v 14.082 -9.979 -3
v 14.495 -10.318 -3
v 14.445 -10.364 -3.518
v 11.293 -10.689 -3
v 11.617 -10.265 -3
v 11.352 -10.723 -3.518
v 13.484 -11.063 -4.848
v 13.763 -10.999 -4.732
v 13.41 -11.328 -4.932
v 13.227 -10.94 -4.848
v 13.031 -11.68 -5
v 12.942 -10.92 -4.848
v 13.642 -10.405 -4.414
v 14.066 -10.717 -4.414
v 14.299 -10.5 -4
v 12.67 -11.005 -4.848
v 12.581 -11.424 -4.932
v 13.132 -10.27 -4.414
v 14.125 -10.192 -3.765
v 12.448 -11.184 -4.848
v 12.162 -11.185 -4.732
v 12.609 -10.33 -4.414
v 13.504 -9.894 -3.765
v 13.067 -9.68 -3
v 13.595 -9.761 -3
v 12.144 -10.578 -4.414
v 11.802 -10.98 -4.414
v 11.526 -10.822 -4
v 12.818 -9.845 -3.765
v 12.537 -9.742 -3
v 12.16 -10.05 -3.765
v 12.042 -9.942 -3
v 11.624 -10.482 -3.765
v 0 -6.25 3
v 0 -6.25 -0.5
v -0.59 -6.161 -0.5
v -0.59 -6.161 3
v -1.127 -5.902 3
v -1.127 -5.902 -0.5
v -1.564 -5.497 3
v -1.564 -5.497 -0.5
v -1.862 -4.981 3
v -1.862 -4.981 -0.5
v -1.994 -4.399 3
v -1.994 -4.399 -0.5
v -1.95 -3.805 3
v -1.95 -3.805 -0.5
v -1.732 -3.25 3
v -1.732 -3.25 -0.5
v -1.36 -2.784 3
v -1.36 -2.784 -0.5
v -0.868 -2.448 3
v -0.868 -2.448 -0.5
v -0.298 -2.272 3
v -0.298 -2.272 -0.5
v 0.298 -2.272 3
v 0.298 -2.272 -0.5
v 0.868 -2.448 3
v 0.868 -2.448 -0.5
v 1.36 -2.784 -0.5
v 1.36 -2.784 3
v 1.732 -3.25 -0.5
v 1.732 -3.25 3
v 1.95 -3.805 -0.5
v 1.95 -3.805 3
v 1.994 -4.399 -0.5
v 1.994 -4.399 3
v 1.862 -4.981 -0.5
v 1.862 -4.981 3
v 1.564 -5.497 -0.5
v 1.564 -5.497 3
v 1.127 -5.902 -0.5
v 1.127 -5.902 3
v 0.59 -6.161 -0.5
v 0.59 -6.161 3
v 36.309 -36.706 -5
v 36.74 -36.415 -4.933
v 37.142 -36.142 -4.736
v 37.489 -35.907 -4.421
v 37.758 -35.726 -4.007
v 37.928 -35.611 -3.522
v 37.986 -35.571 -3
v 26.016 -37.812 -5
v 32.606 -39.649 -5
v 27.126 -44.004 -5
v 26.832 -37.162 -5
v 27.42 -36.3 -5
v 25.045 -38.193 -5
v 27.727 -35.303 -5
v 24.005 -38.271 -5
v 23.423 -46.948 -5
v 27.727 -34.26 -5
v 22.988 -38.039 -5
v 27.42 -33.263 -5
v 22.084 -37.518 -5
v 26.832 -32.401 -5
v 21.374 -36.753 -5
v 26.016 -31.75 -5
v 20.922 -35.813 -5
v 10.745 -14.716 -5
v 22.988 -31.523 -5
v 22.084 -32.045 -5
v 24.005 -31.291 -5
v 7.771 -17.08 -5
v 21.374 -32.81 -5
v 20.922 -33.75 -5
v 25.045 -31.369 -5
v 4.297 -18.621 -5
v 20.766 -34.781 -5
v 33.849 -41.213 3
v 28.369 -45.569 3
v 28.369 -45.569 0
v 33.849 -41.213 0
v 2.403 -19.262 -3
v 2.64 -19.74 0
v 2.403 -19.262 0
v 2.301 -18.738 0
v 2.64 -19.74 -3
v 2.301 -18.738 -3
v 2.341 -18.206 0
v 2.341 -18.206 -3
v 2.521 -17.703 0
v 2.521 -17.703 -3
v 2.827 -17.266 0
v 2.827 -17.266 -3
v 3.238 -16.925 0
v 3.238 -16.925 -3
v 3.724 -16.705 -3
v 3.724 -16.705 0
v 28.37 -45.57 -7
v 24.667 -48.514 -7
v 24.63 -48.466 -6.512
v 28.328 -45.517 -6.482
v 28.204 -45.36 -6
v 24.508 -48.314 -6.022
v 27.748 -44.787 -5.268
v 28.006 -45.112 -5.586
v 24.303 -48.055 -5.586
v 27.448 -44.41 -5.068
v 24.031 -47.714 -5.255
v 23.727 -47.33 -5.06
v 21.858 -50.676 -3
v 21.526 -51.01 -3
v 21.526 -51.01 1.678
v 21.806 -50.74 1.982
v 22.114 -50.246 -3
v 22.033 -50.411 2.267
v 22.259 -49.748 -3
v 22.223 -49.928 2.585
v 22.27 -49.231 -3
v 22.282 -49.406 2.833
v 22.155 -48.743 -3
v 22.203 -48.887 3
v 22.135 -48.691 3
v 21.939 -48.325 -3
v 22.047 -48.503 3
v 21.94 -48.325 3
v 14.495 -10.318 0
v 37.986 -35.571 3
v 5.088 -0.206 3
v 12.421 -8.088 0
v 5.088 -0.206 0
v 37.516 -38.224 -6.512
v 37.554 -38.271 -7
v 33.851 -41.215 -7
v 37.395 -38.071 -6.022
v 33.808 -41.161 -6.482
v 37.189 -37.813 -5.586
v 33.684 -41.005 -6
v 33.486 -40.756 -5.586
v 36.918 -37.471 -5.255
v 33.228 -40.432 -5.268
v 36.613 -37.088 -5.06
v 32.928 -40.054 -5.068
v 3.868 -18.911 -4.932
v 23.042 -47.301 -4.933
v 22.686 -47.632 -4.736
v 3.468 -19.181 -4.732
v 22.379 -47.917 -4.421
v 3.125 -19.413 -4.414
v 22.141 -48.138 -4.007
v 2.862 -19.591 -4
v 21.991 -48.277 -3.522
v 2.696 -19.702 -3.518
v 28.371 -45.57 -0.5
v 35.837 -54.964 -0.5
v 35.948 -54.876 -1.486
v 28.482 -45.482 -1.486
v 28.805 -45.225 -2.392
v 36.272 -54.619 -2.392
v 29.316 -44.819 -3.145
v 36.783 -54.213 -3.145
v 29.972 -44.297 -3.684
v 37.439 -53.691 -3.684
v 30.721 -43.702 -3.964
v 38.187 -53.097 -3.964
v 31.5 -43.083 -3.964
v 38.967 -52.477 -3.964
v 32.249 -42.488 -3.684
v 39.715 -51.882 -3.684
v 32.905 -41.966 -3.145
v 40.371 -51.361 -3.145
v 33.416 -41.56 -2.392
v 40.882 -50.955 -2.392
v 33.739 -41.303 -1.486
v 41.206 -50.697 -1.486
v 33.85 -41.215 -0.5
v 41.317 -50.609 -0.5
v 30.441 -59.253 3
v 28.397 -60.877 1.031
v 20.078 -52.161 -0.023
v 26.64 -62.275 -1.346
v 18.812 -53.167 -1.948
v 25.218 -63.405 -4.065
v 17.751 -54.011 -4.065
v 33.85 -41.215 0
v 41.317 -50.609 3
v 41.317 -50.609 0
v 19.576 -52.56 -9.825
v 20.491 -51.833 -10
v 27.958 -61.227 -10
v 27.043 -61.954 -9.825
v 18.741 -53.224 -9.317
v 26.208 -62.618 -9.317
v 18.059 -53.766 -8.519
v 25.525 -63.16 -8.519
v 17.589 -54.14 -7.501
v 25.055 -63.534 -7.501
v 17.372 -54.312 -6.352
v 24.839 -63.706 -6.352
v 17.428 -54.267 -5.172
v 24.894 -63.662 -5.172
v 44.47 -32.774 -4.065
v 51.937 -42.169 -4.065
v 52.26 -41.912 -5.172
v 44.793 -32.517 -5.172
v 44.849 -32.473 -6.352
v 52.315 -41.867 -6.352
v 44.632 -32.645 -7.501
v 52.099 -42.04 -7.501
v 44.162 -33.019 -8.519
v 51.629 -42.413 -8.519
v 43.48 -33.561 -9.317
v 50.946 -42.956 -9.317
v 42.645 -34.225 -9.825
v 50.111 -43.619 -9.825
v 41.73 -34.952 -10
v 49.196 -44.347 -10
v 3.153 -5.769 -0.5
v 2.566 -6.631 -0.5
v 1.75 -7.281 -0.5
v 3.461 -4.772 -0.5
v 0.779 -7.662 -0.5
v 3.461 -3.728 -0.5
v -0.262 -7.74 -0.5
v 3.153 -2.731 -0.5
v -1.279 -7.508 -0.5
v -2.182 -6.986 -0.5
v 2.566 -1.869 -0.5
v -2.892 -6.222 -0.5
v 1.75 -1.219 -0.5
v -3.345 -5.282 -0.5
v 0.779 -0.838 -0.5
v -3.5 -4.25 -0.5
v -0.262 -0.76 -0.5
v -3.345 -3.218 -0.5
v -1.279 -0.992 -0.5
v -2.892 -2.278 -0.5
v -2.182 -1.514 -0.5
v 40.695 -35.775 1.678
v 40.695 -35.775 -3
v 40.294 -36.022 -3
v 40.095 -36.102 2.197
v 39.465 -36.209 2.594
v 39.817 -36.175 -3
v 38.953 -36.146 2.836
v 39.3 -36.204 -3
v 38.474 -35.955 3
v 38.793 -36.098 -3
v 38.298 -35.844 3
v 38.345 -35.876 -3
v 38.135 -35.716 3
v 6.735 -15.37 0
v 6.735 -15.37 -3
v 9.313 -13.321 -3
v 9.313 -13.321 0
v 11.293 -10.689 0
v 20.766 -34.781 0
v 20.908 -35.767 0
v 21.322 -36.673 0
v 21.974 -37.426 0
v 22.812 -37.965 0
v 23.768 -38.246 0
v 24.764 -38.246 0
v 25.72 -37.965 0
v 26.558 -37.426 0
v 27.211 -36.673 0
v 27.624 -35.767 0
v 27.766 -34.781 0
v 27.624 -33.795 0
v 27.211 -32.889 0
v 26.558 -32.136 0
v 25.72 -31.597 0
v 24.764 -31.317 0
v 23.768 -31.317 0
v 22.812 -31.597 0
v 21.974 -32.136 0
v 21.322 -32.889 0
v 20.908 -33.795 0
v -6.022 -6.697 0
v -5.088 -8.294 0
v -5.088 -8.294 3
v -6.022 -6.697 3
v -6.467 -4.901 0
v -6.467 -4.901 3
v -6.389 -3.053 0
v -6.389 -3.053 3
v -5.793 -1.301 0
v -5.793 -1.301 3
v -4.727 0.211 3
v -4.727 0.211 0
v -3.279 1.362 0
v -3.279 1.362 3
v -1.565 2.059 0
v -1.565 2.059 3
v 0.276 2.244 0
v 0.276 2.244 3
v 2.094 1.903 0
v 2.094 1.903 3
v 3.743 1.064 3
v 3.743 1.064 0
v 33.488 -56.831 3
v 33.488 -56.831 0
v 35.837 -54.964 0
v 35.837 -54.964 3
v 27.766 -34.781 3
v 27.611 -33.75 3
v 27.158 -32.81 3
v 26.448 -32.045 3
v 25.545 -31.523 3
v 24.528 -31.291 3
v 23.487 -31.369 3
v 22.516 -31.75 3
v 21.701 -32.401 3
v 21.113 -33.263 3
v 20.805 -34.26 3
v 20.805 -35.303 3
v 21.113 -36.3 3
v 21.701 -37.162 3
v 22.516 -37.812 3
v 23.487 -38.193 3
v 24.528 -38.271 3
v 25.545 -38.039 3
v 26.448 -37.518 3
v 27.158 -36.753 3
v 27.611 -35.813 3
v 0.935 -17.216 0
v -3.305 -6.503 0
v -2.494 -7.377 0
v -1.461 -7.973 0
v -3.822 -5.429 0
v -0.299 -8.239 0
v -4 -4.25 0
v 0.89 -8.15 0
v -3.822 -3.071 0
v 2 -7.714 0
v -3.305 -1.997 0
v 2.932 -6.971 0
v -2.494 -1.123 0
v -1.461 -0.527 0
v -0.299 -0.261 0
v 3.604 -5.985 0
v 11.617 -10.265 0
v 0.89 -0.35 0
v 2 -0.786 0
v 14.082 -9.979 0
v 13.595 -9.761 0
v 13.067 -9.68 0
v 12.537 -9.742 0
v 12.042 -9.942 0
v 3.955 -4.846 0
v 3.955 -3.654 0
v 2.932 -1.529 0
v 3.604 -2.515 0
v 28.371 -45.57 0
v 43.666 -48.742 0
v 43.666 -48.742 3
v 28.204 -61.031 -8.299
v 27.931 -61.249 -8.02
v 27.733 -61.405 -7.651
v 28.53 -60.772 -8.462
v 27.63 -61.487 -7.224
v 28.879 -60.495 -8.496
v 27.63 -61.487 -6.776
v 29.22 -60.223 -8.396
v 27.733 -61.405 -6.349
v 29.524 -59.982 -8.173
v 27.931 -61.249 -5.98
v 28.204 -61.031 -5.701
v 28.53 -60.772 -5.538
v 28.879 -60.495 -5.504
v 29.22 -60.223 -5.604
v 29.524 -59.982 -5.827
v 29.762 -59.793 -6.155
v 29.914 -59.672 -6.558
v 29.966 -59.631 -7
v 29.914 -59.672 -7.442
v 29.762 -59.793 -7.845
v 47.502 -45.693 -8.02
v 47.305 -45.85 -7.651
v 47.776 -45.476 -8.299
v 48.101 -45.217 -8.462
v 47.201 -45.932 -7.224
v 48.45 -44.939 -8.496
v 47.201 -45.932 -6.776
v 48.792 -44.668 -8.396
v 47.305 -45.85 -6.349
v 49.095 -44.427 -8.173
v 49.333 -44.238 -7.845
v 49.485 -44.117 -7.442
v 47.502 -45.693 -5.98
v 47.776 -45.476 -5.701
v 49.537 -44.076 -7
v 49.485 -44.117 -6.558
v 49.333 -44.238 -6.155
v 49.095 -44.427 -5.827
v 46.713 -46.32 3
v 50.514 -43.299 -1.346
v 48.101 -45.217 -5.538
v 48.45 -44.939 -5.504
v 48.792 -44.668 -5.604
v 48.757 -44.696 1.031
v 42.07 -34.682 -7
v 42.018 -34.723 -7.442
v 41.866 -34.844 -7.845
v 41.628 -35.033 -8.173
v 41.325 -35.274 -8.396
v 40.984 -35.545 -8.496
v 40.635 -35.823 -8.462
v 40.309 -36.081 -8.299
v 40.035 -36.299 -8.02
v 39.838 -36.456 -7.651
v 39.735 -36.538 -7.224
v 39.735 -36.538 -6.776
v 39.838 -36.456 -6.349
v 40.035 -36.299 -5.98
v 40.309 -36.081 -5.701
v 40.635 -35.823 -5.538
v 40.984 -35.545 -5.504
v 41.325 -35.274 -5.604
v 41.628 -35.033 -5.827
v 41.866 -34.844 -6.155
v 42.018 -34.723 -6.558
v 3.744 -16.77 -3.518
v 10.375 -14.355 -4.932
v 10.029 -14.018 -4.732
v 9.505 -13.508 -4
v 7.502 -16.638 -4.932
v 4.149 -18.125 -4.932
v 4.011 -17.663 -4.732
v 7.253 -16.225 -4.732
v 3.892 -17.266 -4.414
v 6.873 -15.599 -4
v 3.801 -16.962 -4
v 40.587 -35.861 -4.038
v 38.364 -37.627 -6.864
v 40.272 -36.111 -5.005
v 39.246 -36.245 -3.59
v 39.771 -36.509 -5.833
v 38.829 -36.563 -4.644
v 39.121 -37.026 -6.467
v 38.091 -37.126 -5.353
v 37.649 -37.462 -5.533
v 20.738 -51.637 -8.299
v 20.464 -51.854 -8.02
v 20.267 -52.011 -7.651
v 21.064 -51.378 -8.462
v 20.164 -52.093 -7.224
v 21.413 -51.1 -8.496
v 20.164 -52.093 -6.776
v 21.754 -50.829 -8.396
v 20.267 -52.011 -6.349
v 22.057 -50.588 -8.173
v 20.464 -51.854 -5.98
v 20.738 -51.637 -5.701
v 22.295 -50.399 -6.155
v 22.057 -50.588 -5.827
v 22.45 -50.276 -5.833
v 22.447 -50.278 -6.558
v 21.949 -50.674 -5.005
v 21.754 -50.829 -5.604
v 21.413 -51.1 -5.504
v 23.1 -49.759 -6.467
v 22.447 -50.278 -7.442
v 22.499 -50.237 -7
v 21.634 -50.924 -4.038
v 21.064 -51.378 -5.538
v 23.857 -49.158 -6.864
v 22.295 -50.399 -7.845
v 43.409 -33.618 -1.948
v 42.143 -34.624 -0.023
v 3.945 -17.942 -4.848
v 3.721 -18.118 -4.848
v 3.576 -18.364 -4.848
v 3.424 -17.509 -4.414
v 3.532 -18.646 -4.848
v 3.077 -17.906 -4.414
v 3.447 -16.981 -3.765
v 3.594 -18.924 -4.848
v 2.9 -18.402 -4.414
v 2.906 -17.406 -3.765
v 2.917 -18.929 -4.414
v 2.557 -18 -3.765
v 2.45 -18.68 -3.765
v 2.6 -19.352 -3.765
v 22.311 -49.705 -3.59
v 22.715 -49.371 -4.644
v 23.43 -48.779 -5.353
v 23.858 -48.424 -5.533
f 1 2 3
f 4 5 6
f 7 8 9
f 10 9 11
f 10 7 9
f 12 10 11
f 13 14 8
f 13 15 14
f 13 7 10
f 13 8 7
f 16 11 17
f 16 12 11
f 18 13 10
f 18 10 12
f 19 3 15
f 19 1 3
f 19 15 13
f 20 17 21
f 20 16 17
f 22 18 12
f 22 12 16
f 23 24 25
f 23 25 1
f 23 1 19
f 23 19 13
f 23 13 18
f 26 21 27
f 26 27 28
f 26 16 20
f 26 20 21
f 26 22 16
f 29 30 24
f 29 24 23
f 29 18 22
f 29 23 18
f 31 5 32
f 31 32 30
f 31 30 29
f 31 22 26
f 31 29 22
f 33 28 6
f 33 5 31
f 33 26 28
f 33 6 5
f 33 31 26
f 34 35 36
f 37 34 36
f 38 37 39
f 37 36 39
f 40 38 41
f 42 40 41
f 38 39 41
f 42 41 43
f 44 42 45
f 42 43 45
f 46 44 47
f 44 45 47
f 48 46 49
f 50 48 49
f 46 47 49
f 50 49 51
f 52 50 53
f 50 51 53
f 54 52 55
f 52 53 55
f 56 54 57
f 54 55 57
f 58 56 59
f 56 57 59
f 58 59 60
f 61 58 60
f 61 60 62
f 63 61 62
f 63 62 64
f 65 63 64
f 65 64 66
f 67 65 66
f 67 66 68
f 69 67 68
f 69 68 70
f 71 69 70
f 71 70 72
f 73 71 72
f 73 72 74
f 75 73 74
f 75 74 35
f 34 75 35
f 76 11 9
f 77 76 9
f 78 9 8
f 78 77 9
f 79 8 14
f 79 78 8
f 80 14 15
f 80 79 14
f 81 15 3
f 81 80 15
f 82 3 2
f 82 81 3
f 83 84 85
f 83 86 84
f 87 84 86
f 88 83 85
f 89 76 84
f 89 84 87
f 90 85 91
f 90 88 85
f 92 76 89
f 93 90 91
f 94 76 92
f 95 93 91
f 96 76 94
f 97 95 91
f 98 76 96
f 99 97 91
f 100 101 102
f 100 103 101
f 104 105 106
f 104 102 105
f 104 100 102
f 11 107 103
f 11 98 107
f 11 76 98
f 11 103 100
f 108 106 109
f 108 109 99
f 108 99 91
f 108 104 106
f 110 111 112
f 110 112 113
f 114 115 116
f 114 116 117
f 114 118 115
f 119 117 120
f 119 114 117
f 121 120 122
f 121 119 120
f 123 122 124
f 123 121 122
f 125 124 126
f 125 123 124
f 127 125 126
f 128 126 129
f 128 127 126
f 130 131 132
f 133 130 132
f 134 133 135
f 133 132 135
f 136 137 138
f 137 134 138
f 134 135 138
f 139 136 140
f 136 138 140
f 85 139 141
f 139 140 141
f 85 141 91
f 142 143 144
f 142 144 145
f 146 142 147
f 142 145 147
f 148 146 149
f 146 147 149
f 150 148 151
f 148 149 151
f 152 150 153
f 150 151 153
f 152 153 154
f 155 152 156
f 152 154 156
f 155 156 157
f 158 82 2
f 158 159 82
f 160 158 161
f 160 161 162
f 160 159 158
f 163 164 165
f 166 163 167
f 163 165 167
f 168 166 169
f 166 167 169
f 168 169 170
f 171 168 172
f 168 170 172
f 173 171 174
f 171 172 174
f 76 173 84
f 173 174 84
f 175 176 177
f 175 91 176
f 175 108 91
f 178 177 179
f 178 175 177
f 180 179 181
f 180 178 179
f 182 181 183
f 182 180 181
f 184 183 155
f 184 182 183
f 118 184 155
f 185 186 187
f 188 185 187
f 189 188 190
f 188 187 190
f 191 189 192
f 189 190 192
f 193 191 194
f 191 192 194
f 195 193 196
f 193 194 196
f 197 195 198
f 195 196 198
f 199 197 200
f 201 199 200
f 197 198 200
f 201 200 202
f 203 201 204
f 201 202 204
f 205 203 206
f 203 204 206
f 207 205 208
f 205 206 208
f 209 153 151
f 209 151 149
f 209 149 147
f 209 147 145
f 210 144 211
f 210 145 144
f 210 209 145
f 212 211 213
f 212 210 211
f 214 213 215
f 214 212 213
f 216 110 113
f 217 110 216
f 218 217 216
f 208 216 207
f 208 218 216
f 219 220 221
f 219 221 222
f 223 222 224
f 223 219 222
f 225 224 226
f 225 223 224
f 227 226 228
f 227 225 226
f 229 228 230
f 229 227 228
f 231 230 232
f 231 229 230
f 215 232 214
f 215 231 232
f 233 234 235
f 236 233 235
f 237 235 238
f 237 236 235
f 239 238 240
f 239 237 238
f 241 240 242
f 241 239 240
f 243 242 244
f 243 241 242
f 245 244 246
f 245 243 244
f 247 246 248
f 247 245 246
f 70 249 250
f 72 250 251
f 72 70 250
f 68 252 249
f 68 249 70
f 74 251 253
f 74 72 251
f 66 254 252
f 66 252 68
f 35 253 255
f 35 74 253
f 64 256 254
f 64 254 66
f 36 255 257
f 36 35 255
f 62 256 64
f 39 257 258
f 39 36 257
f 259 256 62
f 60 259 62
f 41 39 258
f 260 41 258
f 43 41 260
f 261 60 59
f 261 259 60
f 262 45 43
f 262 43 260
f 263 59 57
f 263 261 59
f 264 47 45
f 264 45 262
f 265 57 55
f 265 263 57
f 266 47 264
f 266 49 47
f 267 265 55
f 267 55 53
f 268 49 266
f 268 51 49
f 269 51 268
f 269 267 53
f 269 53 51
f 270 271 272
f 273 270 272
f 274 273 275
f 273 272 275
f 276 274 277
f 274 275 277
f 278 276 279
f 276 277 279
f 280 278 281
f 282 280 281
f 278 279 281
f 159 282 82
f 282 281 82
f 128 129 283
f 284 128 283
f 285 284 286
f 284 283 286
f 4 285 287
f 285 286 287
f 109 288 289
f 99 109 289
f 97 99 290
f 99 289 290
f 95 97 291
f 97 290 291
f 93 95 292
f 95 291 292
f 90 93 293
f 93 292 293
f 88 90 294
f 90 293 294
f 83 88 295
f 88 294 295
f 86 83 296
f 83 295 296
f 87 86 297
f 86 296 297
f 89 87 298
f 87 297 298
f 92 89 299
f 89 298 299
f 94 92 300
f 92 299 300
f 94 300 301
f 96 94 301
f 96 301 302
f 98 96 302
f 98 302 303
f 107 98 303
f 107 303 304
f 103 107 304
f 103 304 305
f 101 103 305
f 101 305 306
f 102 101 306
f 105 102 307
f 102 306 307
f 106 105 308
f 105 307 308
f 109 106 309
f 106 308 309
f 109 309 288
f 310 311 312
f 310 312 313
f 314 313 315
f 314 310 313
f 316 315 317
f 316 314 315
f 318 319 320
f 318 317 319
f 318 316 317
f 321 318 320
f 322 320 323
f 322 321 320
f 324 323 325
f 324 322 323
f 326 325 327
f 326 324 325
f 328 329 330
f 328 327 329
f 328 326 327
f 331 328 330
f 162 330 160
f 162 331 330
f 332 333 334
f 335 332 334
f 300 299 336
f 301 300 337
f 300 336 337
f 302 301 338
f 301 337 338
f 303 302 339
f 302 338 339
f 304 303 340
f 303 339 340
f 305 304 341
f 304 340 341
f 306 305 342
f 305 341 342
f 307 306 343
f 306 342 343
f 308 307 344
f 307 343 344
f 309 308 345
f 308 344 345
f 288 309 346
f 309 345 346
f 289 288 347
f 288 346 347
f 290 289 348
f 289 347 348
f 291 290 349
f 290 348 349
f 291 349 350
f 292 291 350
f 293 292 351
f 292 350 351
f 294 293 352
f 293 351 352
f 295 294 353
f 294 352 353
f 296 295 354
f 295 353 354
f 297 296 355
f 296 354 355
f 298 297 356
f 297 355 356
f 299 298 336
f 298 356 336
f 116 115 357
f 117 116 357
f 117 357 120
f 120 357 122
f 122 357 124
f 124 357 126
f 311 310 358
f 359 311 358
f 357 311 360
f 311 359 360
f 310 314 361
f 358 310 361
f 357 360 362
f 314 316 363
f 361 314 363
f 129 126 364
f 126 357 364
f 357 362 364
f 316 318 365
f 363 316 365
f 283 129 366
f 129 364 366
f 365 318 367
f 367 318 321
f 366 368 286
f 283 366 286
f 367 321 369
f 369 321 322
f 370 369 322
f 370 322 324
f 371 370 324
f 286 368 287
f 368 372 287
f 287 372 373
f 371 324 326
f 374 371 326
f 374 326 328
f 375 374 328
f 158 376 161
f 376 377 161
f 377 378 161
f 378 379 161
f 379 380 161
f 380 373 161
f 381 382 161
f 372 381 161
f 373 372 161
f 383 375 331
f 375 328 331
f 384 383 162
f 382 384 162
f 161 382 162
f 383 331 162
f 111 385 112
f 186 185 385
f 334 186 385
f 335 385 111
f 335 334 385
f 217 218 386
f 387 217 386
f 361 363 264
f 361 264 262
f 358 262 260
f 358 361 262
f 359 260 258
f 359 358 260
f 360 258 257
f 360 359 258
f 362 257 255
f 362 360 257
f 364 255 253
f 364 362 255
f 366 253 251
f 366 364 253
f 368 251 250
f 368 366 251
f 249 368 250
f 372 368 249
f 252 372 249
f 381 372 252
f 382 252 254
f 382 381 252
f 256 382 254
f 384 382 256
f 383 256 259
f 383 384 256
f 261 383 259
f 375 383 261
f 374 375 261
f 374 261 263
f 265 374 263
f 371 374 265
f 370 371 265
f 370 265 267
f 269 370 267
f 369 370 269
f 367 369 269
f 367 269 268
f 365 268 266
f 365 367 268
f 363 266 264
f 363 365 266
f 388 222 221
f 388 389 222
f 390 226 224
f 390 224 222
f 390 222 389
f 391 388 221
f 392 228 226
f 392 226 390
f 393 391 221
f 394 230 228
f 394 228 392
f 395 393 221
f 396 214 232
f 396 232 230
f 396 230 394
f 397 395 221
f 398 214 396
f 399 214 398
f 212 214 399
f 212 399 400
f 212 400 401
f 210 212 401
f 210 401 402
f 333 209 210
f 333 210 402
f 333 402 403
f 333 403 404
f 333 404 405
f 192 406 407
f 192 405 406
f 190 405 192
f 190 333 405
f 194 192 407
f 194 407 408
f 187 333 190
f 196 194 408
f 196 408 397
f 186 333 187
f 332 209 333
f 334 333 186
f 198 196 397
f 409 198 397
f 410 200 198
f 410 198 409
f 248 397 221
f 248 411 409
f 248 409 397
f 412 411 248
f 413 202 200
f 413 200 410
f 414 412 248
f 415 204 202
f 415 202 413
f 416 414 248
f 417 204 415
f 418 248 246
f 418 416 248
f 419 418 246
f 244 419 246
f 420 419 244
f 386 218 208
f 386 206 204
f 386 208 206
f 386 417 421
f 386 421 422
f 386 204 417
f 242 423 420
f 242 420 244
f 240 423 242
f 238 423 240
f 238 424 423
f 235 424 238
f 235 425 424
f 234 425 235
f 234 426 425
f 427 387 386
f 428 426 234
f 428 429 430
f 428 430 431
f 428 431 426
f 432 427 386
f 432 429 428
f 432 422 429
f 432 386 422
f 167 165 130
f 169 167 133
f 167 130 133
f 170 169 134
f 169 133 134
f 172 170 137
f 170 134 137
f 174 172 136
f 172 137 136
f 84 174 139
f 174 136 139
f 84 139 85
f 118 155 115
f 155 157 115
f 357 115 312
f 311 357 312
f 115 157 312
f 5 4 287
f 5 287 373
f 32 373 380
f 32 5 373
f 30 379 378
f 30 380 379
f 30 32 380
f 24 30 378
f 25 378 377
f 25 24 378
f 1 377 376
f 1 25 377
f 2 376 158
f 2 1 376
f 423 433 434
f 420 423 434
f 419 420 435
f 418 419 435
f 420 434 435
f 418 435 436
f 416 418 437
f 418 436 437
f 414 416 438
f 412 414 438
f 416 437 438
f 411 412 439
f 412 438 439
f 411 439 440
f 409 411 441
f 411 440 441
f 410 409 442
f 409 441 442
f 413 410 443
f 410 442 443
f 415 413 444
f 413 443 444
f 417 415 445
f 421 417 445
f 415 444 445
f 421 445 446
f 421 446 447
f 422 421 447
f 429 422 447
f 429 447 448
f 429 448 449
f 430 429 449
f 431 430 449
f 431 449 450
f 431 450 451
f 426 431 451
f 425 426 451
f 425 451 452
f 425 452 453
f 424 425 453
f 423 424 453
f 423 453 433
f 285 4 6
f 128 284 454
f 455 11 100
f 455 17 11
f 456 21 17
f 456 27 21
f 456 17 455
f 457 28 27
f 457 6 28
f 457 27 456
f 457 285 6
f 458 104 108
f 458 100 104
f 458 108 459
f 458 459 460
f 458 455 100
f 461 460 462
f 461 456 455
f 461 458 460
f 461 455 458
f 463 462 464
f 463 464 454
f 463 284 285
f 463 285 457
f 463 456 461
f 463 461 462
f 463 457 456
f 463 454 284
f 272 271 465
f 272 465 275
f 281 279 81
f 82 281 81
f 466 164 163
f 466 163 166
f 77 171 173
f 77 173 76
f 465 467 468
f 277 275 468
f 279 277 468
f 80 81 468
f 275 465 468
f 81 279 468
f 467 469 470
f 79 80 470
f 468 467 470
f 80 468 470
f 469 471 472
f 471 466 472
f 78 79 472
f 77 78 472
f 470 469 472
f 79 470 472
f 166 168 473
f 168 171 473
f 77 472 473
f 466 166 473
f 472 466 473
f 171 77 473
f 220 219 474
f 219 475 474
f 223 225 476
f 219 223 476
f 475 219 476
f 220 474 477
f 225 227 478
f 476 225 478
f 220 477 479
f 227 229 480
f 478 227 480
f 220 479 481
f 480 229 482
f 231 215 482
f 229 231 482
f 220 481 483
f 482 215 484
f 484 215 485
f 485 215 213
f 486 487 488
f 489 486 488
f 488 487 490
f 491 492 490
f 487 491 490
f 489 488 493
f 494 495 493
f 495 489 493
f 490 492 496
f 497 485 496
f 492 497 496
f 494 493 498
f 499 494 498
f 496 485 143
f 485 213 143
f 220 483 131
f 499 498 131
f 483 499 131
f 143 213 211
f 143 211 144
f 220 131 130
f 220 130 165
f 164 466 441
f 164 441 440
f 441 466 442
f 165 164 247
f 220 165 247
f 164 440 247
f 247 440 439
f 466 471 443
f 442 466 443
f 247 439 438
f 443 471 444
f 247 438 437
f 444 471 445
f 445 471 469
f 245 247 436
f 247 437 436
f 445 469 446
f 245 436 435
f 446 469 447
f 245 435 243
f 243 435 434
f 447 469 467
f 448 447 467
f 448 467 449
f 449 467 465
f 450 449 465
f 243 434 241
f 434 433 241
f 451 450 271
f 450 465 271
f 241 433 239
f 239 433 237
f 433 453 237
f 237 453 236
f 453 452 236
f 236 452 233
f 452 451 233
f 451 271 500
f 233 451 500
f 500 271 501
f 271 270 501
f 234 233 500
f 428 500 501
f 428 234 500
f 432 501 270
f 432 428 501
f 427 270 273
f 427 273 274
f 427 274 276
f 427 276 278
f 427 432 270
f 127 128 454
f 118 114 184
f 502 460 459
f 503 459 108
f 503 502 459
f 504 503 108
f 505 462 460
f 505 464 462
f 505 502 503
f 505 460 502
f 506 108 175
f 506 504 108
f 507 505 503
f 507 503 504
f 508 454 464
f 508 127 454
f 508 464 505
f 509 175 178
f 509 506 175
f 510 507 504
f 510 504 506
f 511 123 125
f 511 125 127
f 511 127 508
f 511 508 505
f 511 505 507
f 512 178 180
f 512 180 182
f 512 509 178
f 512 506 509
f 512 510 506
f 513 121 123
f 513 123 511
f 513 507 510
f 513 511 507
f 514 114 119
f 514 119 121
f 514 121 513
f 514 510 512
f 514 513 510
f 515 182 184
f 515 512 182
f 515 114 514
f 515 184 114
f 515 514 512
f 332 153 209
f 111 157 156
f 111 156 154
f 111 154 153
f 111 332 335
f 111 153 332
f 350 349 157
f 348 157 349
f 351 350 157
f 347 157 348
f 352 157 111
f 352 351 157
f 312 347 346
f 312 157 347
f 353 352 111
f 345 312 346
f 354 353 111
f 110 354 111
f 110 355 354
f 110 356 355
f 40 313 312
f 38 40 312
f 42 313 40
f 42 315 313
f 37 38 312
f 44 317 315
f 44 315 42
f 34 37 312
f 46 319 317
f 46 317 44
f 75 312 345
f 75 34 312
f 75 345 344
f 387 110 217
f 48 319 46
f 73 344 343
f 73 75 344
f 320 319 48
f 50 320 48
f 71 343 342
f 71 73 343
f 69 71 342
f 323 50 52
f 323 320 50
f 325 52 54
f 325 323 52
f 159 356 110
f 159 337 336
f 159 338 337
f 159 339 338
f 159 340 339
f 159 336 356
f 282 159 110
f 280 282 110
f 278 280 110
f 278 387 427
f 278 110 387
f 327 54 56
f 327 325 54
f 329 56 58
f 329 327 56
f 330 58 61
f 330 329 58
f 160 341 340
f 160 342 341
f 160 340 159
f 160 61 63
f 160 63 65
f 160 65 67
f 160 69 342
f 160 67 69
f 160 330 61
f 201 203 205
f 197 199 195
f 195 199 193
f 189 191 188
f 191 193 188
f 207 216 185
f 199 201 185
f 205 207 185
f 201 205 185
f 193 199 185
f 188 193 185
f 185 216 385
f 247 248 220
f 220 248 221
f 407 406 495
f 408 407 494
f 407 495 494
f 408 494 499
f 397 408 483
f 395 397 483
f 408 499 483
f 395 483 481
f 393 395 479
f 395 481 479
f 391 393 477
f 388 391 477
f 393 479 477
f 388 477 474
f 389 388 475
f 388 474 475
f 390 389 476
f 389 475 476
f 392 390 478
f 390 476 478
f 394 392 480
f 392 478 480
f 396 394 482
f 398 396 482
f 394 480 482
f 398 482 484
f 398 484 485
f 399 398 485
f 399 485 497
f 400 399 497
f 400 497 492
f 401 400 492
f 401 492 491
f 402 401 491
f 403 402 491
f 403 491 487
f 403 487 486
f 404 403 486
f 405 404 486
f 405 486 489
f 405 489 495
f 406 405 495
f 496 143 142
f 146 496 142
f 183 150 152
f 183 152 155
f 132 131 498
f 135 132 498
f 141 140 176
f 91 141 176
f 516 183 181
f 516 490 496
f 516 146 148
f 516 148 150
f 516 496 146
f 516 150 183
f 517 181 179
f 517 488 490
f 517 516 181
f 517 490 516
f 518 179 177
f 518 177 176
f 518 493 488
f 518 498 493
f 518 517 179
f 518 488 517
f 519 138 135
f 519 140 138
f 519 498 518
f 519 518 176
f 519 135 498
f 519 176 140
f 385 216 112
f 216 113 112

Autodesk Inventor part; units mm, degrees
ref_plane "YZ Plane" through (0, 0, 0) normal (1, 0, 0) x (0, 1, 0)
ref_plane "XY Plane" through (0, 0, 0) normal (0, 0, 1) x (1, 0, 0)
sketch "Skizze1" plane through (0, 0, 0) normal (0, 0, 1) x (1, 0, 0)
  line L0 (23.3115, -64.9198) -> (53.8426, -40.6536) projected
  circle A0 centre (0, -4.25) radius 6.5
  line L1 (43.6656, -48.7423) -> (33.4885, -56.8311)
  line L2 (33.4885, -56.8311) -> (-5.0885, -8.2944)
  line L3 (-5.0885, -8.2944) -> (5.0885, -0.2056)
  line L4 (5.0885, -0.2056) -> (43.6656, -48.7423)
  point P0 (0, 0)
  dimension "d0" = 13
extrude "Extrusion1" add sketch "Skizze1" along normal blind 3
sketch "Skizze2" plane through (43.6656, -48.7423, 0) normal (0.6222102, -0.7828502, 0) x (0.7828502, 0.6222102, 0)
  circle A0 centre (-17.7583, -20) radius 1.5 projected
  circle A1 centre (4.7583, -20) radius 1.5 projected
  circle A2 centre (-6.5, -0.5) radius 1.5 projected
  line L0 (-23, -30.5) -> (10, -30.5) projected
  line L1 (10, -30.5) -> (10, -26.4615) projected
  arc A3 (11.0169, -22.0678) -> (10, -26.4615) centre (20, -26.4615) ccw projected
  arc A4 (11.0169, -22.0678) -> (-24.0169, -22.0678) centre (-6.5, -13.5) ccw projected
  arc A5 (-23, -26.4615) -> (-24.0169, -22.0678) centre (-33, -26.4615) ccw projected
  line L2 (-23, -26.4615) -> (-23, -30.5) projected
  line L3 (12.6833, -10) -> (-25.6833, -10)
  line L4 (-104.8912, -12) -> (94.8547, -12)
  line L5 (-13, 3) -> (0, 3) projected
  line L6 (3.8923, 3) -> (-16.8923, 3)
  line L7 (-21.75, -5.4123) -> (-19, -3.8246) projected
  line L8 (-19, -3.8246) -> (-16.25, -5.4123) projected
  line L9 (-16.25, -5.4123) -> (-16.25, -8.5877) projected
  line L10 (-16.25, -8.5877) -> (-19, -10.1754) projected
  line L11 (-19, -10.1754) -> (-21.75, -8.5877) projected
  line L12 (-21.75, -8.5877) -> (-21.75, -5.4123) projected
  line L13 (3.25, -5.4123) -> (6, -3.8246) projected
  line L14 (6, -3.8246) -> (8.75, -5.4123) projected
  line L15 (8.75, -5.4123) -> (8.75, -8.5877) projected
  line L16 (8.75, -8.5877) -> (6, -10.1754) projected
  line L17 (6, -10.1754) -> (3.25, -8.5877) projected
  line L18 (3.25, -8.5877) -> (3.25, -5.4123) projected
  circle A6 centre (-6.5, -13.5) radius 5 projected
  point P0 (-3.8556, 0)
  dimension "d3" = 2
extrude "Extrusion2" add sketch "Skizze2" against normal blind 12 contours A4 L6 L5 L3 L16 L15 L14 L13 L18 L17 A6 L10 L9 L8 L7 L12 L11 | L11 L12 L7 L8 L9 L10 L3 | A6 L3 | L3 L17 L18 L13 L14 L15 L16
sketch "Skizze3" plane through (0, 0, 3) normal (0, 0, 1) x (1, 0, 0)
  line L0 (36.199, -39.3481) -> (5.0885, -0.2056) projected
  arc A0 (5.0885, -0.2056) -> (-5.0885, -8.2944) centre (0, -4.25) ccw projected
  line L1 (-5.0885, -8.2944) -> (26.022, -47.4369) projected
  line L2 (22.9749, -49.8587) -> (26.022, -47.4369) projected
  line L3 (30.4414, -59.2529) -> (22.9749, -49.8587) projected
  line L4 (46.7127, -46.3205) -> (30.4414, -59.2529) projected
  line L5 (46.7127, -46.3205) -> (39.2461, -36.9263) projected
  line L6 (36.199, -39.3481) -> (39.2461, -36.9263) projected
  line L7 (22.9749, -49.8587) -> (-5.0885, -8.2944)
  line L8 (39.2461, -36.9263) -> (5.0885, -0.2056)
  point P0 (0, 0)
extrude "Extrusion3" add sketch "Skizze3" against normal up to surface (3 mm away) contours L0 L8 L6 | L1 L2 L7
sketch "Skizze4" plane through (23.5594, -64.7228, -10) normal (0.6222102, -0.7828502, 0) x (0.7828502, 0.6222102, 0)
  line L0 (29.5756, 13) -> (8.791, 13) projected
  arc A0 (8.791, 13) -> (0, 0) centre (19.1833, -3.5) ccw projected
  line L1 (0, 0) -> (38.3667, 0) projected
  arc A1 (38.3667, 0) -> (29.5756, 13) centre (19.1833, -3.5) ccw projected
  arc A2 (17.7691, 10) -> (20.5975, 10) centre (19.1833, 9.5) ccw projected
  line L2 (17.7691, 10) -> (20.5975, 10) projected
  circle A3 centre (19.1833, 9.5) radius 1.5
  circle A4 centre (19.1833, 9.5) radius 3.5
  point P0 (21.8277, 10)
  dimension "d8" = 7
extrude "Extrusion4" cut sketch "Skizze4" against normal blind 12 contours A4 | L2 A2 | A3 L2
sketch "Skizze6" plane through (23.5594, -64.7228, -10) normal (0.6222102, -0.7828502, 0) x (0.7828502, 0.6222102, 0)
  circle A0 centre (19.1833, 9.5) radius 3.5 projected
  line L0 (29.5756, 13) -> (19.1833, 13) construction
  arc A1 (8.791, 13) -> (0, 0) centre (19.1833, -3.5) ccw construction
  line L1 (0, 0) -> (38.3667, 0) construction
  arc A2 (38.3667, 0) -> (29.5756, 13) centre (19.1833, -3.5) ccw construction
  line L2 (15.6833, 13) -> (22.6833, 13)
  line L3 (22.6833, 13) -> (22.6833, 9.5)
  line L4 (22.6833, 9.5) -> (15.6833, 9.5)
  line L5 (15.6833, 9.5) -> (15.6833, 13)
  circle A3 centre (19.1833, 9.5) radius 3.5 projected
  line L6 (19.1833, 13) -> (8.791, 13) projected
  point P0 (21.8277, 10)
  point P1 (21.0706, 13)
  point P2 (17.4651, 13)
extrude "Extrusion6" cut sketch "Skizze6" against normal up to surface (12 mm away) contours L4 A0 | A0 L2 L3 | A0 L5 L2 picked at (20.0662, 10.487)
sketch "Skizze7" plane through (36.199, -39.3481, 0) normal (-0.6222102, 0.7828502, 0) x (0.7828502, 0.6222102, 0)
  line L0 (-16.8923, -3) -> (-16.8923, 0) projected
  line L1 (-16.8923, 0) -> (-10, 0) projected
  line L2 (3.8923, 0) -> (3.8923, -3) projected
  arc A0 (3.8923, -3) -> (12.6833, 10) centre (-6.5, 13.5) ccw projected
  line L3 (12.6833, 10) -> (-25.6833, 10) projected
  arc A1 (-25.6833, 10) -> (-16.8923, -3) centre (-6.5, 13.5) ccw projected
  circle A2 centre (-19, 7) radius 1.5 projected
  circle A3 centre (6, 7) radius 1.5 projected
  line L4 (-3, 0.5) -> (-3, 0) projected
  line L5 (3.8923, 0) -> (-3, 0) projected
  line L6 (-10, 0) -> (-10, 0.5) projected
  arc A4 (-3, 0.5) -> (-10, 0.5) centre (-6.5, 0.5) ccw projected
  point P0 (-3.8556, 0)
extrude "Extrusion7" cut sketch "Skizze7" against normal through all contours A2 | A3
sketch "Skizze8" plane through (0, 0, 0) normal (0, 0, -1) x (-1, 0, 0)
  line L0 (-22.9749, -49.8587) -> (-28.3705, -45.5702) projected
  line L1 (-22.9749, -49.8587) -> (5.0885, -8.2944) projected
  arc A0 (5.0885, -8.2944) -> (-5.0885, -0.2056) centre (0, -4.25) ccw projected
  line L2 (-5.0885, -0.2056) -> (-39.2461, -36.9263) projected
  circle A1 centre (0, -4.25) radius 3.5
  line L3 (-33.8505, -41.2148) -> (-28.3705, -45.5702) projected
  line L4 (-39.2461, -36.9263) -> (-33.8505, -41.2148) projected
  point P0 (0, 0)
  dimension "d17" = 7
extrude "Extrusion8" add sketch "Skizze8" along normal blind 0.5 contours A1
chamfer "Fase1" distance 0.5 angle 45 1 edges at (3.5, -4.25, 0)
sketch "Skizze9" plane through (0, 0, 3) normal (0, 0, 1) x (1, 0, 0)
  circle A0 centre (0, -4.25) radius 3.5 projected
  point P0 (0, 0)
hole "Bohrung1" at (0, -4.25, 3) direction (0, 0, -1) diameter 4 end through all
sketch "Skizze10" plane through (0, 0, 3) normal (0, 0, 1) x (1, 0, 0)
  circle A0 centre (24.2662, -34.7812) radius 3.5
  point P0 (0, 0)
  dimension "d30" = 7
extrude "Extrusion9" cut sketch "Skizze10" against normal through all
sketch "Skizze11" plane through (0, 0, 0) normal (0, 0, -1) x (-1, 0, 0)
  circle A0 centre (-24.2662, -34.7812) radius 3.5 projected
  line L0 (-22.9749, -49.8587) -> (-28.3705, -45.5702) projected
  line L1 (-22.9749, -49.8587) -> (5.0885, -8.2944) projected
  arc A1 (5.0885, -8.2944) -> (-5.0885, -0.2056) centre (0, -4.25) ccw projected
  line L2 (-5.0885, -0.2056) -> (-39.2461, -36.9263) projected
  circle A2 centre (0, -4.25) radius 4 projected
  arc A3 (-12.4206, -8.0879) -> (-0.9354, -17.2163) centre (0, -4.25) ccw
  line L3 (-22.9749, -49.8587) -> (5.0885, -8.2944) projected
  line L4 (-33.8505, -41.2148) -> (-28.3705, -45.5702) projected
  line L5 (-39.2461, -36.9263) -> (-33.8505, -41.2148) projected
  point P0 (0, 0)
  dimension "d33" = 13
extrude "Extrusion10" add sketch "Skizze11" along normal blind 5 contours L0 L4 L5 L2 A3 L1
fillet "Rundung1" radius 2 2 edges at (0.9354, -17.2163, -2.5) (12.4206, -8.0879, -2.5)
fillet "Rundung2" radius 2 8 edges at (2.4138, -17.9483, -5) (8.0887, -14.4271, -5) (12.8, -9.6934, -5) (26.8705, -23.6221, -5) (12.8073, -34.7996, -5) (22.9749, -49.8587, -1) (39.2461, -36.9263, -1) (31.1105, -43.3925, -5)
fillet "Rundung2" radius 4 2 edges at (49.8614, -36.1536, -10) (19.8261, -60.0257, -10)
properties part number "Mount_B" material "ABS-Kunststoff"
